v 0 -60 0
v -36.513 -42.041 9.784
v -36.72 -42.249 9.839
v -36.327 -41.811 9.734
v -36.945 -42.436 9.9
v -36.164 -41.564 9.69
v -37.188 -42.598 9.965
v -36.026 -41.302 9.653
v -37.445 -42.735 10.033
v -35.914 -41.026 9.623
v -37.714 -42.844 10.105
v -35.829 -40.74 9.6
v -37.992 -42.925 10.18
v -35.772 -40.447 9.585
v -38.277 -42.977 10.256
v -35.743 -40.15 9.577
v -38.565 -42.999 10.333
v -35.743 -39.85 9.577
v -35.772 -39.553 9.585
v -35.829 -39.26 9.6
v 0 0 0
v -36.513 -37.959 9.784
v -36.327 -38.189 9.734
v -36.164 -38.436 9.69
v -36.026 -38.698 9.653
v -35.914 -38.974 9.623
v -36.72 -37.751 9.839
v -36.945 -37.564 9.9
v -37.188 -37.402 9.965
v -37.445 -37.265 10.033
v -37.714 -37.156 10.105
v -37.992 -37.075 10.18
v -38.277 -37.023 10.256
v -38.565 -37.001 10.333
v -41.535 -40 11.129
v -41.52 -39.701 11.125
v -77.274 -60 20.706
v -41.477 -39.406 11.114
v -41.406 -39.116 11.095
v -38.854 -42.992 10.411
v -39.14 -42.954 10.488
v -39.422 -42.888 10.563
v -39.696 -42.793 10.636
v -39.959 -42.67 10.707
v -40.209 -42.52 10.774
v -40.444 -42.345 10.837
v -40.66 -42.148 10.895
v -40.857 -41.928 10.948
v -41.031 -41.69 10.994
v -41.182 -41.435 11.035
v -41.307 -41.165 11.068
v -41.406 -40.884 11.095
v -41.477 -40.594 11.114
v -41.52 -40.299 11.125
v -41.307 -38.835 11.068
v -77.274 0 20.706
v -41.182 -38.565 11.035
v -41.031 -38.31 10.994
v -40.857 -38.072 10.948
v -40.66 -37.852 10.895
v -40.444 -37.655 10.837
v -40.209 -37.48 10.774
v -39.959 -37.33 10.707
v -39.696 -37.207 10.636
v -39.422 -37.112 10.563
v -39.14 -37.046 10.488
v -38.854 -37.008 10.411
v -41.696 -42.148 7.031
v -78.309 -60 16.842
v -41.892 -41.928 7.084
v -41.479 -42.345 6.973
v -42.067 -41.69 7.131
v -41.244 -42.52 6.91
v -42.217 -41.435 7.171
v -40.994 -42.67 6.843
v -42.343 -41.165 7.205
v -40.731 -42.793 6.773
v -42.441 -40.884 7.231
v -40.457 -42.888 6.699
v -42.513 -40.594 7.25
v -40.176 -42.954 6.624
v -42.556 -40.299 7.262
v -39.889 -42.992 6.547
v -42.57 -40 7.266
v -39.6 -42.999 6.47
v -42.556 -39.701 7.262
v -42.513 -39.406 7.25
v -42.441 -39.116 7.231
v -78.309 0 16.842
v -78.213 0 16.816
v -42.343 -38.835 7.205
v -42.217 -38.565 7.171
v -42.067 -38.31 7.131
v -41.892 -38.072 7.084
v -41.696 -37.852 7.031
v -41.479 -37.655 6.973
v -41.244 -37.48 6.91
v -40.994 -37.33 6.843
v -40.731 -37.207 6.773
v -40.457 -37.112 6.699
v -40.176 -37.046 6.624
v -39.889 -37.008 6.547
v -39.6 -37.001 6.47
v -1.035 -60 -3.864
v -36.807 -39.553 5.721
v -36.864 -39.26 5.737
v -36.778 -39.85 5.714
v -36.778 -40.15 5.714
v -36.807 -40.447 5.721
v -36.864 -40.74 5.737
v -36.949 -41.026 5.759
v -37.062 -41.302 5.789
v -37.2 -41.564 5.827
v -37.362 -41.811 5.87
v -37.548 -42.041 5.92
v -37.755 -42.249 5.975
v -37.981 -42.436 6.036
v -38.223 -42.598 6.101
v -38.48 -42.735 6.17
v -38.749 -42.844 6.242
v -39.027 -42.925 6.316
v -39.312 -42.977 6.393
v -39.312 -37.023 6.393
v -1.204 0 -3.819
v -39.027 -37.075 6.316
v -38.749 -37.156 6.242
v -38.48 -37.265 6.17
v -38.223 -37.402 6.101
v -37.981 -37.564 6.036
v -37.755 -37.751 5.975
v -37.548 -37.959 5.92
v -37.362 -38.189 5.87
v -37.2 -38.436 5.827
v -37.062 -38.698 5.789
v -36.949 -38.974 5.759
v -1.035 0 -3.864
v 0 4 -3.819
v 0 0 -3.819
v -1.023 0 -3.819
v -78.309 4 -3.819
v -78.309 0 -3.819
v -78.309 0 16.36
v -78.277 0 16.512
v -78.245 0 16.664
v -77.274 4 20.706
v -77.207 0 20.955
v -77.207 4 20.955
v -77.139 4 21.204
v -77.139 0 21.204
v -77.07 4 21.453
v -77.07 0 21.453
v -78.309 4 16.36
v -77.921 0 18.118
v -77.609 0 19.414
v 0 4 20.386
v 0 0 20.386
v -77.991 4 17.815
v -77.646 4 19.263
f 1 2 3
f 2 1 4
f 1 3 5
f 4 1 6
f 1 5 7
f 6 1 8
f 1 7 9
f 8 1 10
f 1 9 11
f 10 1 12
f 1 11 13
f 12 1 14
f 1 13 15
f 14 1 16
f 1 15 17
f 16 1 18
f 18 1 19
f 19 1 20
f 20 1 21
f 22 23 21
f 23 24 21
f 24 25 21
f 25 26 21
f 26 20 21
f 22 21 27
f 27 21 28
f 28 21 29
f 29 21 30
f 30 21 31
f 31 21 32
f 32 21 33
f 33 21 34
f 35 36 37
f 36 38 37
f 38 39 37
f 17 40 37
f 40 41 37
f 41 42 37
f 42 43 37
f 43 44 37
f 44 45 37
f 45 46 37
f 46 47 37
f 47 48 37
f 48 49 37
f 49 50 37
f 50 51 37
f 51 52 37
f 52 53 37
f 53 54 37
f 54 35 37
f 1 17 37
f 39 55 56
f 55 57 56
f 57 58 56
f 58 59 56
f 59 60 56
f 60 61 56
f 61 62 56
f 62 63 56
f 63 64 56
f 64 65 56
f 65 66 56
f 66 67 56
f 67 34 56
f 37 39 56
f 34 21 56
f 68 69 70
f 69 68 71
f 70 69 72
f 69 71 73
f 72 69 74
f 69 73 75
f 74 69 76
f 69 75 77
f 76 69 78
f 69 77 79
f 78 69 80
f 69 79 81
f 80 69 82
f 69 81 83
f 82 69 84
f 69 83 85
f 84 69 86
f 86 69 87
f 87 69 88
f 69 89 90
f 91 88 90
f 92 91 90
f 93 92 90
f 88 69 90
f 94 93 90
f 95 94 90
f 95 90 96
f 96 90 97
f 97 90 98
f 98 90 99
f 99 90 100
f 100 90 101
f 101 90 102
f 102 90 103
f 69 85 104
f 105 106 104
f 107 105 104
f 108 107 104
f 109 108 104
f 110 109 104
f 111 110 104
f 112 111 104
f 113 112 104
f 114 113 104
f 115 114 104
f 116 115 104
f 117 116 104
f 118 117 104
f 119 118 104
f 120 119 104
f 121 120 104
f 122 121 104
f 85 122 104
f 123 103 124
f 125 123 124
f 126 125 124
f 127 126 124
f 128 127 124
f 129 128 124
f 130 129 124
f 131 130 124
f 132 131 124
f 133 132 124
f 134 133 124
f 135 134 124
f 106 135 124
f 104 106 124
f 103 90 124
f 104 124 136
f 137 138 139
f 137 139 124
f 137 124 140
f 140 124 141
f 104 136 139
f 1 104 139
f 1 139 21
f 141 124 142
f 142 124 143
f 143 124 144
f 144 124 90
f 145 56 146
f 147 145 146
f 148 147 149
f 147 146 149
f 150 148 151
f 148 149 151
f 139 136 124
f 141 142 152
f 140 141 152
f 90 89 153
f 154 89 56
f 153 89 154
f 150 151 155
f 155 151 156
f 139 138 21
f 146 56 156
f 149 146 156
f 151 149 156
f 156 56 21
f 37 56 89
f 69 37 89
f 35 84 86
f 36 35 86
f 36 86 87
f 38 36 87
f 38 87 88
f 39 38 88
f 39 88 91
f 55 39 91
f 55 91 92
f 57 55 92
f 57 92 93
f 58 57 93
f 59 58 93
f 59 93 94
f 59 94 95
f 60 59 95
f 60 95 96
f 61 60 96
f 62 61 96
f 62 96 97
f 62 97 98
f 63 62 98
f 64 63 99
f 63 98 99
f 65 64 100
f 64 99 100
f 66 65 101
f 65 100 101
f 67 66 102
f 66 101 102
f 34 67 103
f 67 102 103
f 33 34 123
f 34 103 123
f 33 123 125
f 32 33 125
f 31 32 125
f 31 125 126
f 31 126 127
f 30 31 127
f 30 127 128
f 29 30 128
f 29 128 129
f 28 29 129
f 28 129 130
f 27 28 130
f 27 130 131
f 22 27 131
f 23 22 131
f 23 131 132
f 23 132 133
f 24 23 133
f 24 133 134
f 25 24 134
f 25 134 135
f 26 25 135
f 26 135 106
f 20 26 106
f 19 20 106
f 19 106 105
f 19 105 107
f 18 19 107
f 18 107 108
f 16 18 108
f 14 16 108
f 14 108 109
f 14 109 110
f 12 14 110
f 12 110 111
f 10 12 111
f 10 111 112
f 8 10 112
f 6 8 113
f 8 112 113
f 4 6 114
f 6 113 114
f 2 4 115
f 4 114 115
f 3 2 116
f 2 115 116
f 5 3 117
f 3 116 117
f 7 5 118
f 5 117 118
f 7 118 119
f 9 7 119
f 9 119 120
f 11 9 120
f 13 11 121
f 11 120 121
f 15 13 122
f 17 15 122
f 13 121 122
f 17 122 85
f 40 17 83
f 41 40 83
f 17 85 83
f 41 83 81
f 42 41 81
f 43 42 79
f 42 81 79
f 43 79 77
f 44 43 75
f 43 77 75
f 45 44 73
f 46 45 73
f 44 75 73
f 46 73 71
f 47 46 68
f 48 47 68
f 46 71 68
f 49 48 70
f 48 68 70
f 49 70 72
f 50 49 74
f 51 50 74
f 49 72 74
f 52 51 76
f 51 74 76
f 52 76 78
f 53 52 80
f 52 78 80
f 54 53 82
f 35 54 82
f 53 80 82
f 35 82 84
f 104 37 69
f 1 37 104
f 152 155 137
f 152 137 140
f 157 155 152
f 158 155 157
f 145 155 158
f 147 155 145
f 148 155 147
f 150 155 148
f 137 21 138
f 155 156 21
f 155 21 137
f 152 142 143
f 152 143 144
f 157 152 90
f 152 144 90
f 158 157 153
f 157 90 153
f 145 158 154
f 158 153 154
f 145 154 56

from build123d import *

# Parameters (mm, degrees)
BOSS_EXTRUDE1_DEPTH = 4
BOSS_EXTRUDE3_DEPTH = 60
SKETCH8_R           = 3
CUT_EXTRUDE2_DEPTH  = 79
BOSS_EXTRUDE5_START = -4
BOSS_EXTRUDE5_DEPTH = 4
CUT_EXTRUDE3_DEPTH  = 4
SKETCH14_W          = 38.062003052
SKETCH14_H          = 100
CUT_EXTRUDE4_DEPTH  = 4
CUT_EXTRUDE5_DEPTH  = 10
SKETCH16_W          = 78.309342284
SKETCH16_H          = 4
BOSS_EXTRUDE6_DEPTH = 10
CUT_EXTRUDE6_DEPTH  = 10


with BuildPart() as part:
    # Sketch1 → Boss-Extrude1 (new body)
    with BuildSketch(Plane(origin=(0, 0, 0), x_dir=(1, 0, 0), z_dir=(0, 1, 0))):
        with BuildLine():
            Line((0, 0), (-80, 0))
            ThreePointArc((-80, 0), (-79.31558891, -10.442095378), (-77.274066103, -20.705523608))
            Line((-77.274066103, -20.705523608), (0, 0))
        make_face()
    extrude(amount=BOSS_EXTRUDE1_DEPTH)

    # Sketch7 → Boss-Extrude3 (add)
    with BuildSketch(Plane.XZ):
        Polygon((0, 0), (-77.274066103, 20.705523608), (-78.309342284, 16.841820303), (-1.03527618, -3.863703305), align=None)
    extrude(amount=BOSS_EXTRUDE3_DEPTH)

    # Sketch8 → Cut-Extrude2 (cut)
    with BuildSketch(Plane(origin=(-1.03527618, 0, -3.863703305), x_dir=(-0.9659258262890682, 0, 0.25881904510252124), z_dir=(-0.25881904510252124, 0, -0.9659258262890682))):
        with Locations((40, -40)):
            Circle(SKETCH8_R)
    extrude(amount=-CUT_EXTRUDE2_DEPTH, mode=Mode.SUBTRACT)

    # Sketch11 → Boss-Extrude5 (add)
    with BuildSketch(Plane(origin=(0, 4, 0), x_dir=(1, 0, 0), z_dir=(0, 1, 0)).offset(BOSS_EXTRUDE5_START)):
        with BuildLine():
            Line((0, 0), (-77.274066103, -20.705523608))
            ThreePointArc((-77.274066103, -20.705523608), (-48.700914321, -63.468267223), (0, -80))
            Line((0, -80), (0, 0))
        make_face()
    extrude(amount=BOSS_EXTRUDE5_DEPTH)

    # Sketch12 → Cut-Extrude3 (cut)
    with BuildSketch(Plane.XZ):
        Polygon((-68.830314461, 40.772390306), (32.565775989, 40.772390306), (32.565775989, 109.047215686), (-78.543674294, 109.047215686), align=None)
    extrude(amount=-CUT_EXTRUDE3_DEPTH, mode=Mode.SUBTRACT)

    # Sketch14 → Cut-Extrude4 (cut)
    with BuildSketch(Plane.XZ):
        with Locations((-97.34034381, -33.158179697)):
            Rectangle(SKETCH14_W, SKETCH14_H)
    extrude(amount=-CUT_EXTRUDE4_DEPTH, mode=Mode.SUBTRACT)

    # Sketch15 → Cut-Extrude5 (cut)
    with BuildSketch(Plane(origin=(0, 0, 0), x_dir=(-1, 0, 0), z_dir=(0, -1, 0))):
        Polygon((81.89924148, -21.519578019), (0, -20.386195153), (0, -64.251910572), (85.684715325, -64.251910572), align=None)
    extrude(amount=-CUT_EXTRUDE5_DEPTH, mode=Mode.SUBTRACT)

    # Sketch16 → Boss-Extrude6 (add)
    with BuildSketch(Plane(origin=(0, 0, 0), x_dir=(-1, 0, 0), z_dir=(0, 0, -1))):
        with Locations((39.154671142, 2)):
            Rectangle(SKETCH16_W, SKETCH16_H)
    extrude(amount=BOSS_EXTRUDE6_DEPTH)

    # Sketch17 → Cut-Extrude6 (cut)
    with BuildSketch(Plane(origin=(0, 0, 0), x_dir=(-1, 0, 0), z_dir=(0, -1, 0))):
        Polygon((1.203546953, 3.818615287), (78.309342284, 3.818615287), (78.309342284, 14.954407394), (-14.190924513, 13.37318069), (-14.190924513, 3.818615287), align=None)
    extrude(amount=-CUT_EXTRUDE6_DEPTH, mode=Mode.SUBTRACT)


solid = part.part
